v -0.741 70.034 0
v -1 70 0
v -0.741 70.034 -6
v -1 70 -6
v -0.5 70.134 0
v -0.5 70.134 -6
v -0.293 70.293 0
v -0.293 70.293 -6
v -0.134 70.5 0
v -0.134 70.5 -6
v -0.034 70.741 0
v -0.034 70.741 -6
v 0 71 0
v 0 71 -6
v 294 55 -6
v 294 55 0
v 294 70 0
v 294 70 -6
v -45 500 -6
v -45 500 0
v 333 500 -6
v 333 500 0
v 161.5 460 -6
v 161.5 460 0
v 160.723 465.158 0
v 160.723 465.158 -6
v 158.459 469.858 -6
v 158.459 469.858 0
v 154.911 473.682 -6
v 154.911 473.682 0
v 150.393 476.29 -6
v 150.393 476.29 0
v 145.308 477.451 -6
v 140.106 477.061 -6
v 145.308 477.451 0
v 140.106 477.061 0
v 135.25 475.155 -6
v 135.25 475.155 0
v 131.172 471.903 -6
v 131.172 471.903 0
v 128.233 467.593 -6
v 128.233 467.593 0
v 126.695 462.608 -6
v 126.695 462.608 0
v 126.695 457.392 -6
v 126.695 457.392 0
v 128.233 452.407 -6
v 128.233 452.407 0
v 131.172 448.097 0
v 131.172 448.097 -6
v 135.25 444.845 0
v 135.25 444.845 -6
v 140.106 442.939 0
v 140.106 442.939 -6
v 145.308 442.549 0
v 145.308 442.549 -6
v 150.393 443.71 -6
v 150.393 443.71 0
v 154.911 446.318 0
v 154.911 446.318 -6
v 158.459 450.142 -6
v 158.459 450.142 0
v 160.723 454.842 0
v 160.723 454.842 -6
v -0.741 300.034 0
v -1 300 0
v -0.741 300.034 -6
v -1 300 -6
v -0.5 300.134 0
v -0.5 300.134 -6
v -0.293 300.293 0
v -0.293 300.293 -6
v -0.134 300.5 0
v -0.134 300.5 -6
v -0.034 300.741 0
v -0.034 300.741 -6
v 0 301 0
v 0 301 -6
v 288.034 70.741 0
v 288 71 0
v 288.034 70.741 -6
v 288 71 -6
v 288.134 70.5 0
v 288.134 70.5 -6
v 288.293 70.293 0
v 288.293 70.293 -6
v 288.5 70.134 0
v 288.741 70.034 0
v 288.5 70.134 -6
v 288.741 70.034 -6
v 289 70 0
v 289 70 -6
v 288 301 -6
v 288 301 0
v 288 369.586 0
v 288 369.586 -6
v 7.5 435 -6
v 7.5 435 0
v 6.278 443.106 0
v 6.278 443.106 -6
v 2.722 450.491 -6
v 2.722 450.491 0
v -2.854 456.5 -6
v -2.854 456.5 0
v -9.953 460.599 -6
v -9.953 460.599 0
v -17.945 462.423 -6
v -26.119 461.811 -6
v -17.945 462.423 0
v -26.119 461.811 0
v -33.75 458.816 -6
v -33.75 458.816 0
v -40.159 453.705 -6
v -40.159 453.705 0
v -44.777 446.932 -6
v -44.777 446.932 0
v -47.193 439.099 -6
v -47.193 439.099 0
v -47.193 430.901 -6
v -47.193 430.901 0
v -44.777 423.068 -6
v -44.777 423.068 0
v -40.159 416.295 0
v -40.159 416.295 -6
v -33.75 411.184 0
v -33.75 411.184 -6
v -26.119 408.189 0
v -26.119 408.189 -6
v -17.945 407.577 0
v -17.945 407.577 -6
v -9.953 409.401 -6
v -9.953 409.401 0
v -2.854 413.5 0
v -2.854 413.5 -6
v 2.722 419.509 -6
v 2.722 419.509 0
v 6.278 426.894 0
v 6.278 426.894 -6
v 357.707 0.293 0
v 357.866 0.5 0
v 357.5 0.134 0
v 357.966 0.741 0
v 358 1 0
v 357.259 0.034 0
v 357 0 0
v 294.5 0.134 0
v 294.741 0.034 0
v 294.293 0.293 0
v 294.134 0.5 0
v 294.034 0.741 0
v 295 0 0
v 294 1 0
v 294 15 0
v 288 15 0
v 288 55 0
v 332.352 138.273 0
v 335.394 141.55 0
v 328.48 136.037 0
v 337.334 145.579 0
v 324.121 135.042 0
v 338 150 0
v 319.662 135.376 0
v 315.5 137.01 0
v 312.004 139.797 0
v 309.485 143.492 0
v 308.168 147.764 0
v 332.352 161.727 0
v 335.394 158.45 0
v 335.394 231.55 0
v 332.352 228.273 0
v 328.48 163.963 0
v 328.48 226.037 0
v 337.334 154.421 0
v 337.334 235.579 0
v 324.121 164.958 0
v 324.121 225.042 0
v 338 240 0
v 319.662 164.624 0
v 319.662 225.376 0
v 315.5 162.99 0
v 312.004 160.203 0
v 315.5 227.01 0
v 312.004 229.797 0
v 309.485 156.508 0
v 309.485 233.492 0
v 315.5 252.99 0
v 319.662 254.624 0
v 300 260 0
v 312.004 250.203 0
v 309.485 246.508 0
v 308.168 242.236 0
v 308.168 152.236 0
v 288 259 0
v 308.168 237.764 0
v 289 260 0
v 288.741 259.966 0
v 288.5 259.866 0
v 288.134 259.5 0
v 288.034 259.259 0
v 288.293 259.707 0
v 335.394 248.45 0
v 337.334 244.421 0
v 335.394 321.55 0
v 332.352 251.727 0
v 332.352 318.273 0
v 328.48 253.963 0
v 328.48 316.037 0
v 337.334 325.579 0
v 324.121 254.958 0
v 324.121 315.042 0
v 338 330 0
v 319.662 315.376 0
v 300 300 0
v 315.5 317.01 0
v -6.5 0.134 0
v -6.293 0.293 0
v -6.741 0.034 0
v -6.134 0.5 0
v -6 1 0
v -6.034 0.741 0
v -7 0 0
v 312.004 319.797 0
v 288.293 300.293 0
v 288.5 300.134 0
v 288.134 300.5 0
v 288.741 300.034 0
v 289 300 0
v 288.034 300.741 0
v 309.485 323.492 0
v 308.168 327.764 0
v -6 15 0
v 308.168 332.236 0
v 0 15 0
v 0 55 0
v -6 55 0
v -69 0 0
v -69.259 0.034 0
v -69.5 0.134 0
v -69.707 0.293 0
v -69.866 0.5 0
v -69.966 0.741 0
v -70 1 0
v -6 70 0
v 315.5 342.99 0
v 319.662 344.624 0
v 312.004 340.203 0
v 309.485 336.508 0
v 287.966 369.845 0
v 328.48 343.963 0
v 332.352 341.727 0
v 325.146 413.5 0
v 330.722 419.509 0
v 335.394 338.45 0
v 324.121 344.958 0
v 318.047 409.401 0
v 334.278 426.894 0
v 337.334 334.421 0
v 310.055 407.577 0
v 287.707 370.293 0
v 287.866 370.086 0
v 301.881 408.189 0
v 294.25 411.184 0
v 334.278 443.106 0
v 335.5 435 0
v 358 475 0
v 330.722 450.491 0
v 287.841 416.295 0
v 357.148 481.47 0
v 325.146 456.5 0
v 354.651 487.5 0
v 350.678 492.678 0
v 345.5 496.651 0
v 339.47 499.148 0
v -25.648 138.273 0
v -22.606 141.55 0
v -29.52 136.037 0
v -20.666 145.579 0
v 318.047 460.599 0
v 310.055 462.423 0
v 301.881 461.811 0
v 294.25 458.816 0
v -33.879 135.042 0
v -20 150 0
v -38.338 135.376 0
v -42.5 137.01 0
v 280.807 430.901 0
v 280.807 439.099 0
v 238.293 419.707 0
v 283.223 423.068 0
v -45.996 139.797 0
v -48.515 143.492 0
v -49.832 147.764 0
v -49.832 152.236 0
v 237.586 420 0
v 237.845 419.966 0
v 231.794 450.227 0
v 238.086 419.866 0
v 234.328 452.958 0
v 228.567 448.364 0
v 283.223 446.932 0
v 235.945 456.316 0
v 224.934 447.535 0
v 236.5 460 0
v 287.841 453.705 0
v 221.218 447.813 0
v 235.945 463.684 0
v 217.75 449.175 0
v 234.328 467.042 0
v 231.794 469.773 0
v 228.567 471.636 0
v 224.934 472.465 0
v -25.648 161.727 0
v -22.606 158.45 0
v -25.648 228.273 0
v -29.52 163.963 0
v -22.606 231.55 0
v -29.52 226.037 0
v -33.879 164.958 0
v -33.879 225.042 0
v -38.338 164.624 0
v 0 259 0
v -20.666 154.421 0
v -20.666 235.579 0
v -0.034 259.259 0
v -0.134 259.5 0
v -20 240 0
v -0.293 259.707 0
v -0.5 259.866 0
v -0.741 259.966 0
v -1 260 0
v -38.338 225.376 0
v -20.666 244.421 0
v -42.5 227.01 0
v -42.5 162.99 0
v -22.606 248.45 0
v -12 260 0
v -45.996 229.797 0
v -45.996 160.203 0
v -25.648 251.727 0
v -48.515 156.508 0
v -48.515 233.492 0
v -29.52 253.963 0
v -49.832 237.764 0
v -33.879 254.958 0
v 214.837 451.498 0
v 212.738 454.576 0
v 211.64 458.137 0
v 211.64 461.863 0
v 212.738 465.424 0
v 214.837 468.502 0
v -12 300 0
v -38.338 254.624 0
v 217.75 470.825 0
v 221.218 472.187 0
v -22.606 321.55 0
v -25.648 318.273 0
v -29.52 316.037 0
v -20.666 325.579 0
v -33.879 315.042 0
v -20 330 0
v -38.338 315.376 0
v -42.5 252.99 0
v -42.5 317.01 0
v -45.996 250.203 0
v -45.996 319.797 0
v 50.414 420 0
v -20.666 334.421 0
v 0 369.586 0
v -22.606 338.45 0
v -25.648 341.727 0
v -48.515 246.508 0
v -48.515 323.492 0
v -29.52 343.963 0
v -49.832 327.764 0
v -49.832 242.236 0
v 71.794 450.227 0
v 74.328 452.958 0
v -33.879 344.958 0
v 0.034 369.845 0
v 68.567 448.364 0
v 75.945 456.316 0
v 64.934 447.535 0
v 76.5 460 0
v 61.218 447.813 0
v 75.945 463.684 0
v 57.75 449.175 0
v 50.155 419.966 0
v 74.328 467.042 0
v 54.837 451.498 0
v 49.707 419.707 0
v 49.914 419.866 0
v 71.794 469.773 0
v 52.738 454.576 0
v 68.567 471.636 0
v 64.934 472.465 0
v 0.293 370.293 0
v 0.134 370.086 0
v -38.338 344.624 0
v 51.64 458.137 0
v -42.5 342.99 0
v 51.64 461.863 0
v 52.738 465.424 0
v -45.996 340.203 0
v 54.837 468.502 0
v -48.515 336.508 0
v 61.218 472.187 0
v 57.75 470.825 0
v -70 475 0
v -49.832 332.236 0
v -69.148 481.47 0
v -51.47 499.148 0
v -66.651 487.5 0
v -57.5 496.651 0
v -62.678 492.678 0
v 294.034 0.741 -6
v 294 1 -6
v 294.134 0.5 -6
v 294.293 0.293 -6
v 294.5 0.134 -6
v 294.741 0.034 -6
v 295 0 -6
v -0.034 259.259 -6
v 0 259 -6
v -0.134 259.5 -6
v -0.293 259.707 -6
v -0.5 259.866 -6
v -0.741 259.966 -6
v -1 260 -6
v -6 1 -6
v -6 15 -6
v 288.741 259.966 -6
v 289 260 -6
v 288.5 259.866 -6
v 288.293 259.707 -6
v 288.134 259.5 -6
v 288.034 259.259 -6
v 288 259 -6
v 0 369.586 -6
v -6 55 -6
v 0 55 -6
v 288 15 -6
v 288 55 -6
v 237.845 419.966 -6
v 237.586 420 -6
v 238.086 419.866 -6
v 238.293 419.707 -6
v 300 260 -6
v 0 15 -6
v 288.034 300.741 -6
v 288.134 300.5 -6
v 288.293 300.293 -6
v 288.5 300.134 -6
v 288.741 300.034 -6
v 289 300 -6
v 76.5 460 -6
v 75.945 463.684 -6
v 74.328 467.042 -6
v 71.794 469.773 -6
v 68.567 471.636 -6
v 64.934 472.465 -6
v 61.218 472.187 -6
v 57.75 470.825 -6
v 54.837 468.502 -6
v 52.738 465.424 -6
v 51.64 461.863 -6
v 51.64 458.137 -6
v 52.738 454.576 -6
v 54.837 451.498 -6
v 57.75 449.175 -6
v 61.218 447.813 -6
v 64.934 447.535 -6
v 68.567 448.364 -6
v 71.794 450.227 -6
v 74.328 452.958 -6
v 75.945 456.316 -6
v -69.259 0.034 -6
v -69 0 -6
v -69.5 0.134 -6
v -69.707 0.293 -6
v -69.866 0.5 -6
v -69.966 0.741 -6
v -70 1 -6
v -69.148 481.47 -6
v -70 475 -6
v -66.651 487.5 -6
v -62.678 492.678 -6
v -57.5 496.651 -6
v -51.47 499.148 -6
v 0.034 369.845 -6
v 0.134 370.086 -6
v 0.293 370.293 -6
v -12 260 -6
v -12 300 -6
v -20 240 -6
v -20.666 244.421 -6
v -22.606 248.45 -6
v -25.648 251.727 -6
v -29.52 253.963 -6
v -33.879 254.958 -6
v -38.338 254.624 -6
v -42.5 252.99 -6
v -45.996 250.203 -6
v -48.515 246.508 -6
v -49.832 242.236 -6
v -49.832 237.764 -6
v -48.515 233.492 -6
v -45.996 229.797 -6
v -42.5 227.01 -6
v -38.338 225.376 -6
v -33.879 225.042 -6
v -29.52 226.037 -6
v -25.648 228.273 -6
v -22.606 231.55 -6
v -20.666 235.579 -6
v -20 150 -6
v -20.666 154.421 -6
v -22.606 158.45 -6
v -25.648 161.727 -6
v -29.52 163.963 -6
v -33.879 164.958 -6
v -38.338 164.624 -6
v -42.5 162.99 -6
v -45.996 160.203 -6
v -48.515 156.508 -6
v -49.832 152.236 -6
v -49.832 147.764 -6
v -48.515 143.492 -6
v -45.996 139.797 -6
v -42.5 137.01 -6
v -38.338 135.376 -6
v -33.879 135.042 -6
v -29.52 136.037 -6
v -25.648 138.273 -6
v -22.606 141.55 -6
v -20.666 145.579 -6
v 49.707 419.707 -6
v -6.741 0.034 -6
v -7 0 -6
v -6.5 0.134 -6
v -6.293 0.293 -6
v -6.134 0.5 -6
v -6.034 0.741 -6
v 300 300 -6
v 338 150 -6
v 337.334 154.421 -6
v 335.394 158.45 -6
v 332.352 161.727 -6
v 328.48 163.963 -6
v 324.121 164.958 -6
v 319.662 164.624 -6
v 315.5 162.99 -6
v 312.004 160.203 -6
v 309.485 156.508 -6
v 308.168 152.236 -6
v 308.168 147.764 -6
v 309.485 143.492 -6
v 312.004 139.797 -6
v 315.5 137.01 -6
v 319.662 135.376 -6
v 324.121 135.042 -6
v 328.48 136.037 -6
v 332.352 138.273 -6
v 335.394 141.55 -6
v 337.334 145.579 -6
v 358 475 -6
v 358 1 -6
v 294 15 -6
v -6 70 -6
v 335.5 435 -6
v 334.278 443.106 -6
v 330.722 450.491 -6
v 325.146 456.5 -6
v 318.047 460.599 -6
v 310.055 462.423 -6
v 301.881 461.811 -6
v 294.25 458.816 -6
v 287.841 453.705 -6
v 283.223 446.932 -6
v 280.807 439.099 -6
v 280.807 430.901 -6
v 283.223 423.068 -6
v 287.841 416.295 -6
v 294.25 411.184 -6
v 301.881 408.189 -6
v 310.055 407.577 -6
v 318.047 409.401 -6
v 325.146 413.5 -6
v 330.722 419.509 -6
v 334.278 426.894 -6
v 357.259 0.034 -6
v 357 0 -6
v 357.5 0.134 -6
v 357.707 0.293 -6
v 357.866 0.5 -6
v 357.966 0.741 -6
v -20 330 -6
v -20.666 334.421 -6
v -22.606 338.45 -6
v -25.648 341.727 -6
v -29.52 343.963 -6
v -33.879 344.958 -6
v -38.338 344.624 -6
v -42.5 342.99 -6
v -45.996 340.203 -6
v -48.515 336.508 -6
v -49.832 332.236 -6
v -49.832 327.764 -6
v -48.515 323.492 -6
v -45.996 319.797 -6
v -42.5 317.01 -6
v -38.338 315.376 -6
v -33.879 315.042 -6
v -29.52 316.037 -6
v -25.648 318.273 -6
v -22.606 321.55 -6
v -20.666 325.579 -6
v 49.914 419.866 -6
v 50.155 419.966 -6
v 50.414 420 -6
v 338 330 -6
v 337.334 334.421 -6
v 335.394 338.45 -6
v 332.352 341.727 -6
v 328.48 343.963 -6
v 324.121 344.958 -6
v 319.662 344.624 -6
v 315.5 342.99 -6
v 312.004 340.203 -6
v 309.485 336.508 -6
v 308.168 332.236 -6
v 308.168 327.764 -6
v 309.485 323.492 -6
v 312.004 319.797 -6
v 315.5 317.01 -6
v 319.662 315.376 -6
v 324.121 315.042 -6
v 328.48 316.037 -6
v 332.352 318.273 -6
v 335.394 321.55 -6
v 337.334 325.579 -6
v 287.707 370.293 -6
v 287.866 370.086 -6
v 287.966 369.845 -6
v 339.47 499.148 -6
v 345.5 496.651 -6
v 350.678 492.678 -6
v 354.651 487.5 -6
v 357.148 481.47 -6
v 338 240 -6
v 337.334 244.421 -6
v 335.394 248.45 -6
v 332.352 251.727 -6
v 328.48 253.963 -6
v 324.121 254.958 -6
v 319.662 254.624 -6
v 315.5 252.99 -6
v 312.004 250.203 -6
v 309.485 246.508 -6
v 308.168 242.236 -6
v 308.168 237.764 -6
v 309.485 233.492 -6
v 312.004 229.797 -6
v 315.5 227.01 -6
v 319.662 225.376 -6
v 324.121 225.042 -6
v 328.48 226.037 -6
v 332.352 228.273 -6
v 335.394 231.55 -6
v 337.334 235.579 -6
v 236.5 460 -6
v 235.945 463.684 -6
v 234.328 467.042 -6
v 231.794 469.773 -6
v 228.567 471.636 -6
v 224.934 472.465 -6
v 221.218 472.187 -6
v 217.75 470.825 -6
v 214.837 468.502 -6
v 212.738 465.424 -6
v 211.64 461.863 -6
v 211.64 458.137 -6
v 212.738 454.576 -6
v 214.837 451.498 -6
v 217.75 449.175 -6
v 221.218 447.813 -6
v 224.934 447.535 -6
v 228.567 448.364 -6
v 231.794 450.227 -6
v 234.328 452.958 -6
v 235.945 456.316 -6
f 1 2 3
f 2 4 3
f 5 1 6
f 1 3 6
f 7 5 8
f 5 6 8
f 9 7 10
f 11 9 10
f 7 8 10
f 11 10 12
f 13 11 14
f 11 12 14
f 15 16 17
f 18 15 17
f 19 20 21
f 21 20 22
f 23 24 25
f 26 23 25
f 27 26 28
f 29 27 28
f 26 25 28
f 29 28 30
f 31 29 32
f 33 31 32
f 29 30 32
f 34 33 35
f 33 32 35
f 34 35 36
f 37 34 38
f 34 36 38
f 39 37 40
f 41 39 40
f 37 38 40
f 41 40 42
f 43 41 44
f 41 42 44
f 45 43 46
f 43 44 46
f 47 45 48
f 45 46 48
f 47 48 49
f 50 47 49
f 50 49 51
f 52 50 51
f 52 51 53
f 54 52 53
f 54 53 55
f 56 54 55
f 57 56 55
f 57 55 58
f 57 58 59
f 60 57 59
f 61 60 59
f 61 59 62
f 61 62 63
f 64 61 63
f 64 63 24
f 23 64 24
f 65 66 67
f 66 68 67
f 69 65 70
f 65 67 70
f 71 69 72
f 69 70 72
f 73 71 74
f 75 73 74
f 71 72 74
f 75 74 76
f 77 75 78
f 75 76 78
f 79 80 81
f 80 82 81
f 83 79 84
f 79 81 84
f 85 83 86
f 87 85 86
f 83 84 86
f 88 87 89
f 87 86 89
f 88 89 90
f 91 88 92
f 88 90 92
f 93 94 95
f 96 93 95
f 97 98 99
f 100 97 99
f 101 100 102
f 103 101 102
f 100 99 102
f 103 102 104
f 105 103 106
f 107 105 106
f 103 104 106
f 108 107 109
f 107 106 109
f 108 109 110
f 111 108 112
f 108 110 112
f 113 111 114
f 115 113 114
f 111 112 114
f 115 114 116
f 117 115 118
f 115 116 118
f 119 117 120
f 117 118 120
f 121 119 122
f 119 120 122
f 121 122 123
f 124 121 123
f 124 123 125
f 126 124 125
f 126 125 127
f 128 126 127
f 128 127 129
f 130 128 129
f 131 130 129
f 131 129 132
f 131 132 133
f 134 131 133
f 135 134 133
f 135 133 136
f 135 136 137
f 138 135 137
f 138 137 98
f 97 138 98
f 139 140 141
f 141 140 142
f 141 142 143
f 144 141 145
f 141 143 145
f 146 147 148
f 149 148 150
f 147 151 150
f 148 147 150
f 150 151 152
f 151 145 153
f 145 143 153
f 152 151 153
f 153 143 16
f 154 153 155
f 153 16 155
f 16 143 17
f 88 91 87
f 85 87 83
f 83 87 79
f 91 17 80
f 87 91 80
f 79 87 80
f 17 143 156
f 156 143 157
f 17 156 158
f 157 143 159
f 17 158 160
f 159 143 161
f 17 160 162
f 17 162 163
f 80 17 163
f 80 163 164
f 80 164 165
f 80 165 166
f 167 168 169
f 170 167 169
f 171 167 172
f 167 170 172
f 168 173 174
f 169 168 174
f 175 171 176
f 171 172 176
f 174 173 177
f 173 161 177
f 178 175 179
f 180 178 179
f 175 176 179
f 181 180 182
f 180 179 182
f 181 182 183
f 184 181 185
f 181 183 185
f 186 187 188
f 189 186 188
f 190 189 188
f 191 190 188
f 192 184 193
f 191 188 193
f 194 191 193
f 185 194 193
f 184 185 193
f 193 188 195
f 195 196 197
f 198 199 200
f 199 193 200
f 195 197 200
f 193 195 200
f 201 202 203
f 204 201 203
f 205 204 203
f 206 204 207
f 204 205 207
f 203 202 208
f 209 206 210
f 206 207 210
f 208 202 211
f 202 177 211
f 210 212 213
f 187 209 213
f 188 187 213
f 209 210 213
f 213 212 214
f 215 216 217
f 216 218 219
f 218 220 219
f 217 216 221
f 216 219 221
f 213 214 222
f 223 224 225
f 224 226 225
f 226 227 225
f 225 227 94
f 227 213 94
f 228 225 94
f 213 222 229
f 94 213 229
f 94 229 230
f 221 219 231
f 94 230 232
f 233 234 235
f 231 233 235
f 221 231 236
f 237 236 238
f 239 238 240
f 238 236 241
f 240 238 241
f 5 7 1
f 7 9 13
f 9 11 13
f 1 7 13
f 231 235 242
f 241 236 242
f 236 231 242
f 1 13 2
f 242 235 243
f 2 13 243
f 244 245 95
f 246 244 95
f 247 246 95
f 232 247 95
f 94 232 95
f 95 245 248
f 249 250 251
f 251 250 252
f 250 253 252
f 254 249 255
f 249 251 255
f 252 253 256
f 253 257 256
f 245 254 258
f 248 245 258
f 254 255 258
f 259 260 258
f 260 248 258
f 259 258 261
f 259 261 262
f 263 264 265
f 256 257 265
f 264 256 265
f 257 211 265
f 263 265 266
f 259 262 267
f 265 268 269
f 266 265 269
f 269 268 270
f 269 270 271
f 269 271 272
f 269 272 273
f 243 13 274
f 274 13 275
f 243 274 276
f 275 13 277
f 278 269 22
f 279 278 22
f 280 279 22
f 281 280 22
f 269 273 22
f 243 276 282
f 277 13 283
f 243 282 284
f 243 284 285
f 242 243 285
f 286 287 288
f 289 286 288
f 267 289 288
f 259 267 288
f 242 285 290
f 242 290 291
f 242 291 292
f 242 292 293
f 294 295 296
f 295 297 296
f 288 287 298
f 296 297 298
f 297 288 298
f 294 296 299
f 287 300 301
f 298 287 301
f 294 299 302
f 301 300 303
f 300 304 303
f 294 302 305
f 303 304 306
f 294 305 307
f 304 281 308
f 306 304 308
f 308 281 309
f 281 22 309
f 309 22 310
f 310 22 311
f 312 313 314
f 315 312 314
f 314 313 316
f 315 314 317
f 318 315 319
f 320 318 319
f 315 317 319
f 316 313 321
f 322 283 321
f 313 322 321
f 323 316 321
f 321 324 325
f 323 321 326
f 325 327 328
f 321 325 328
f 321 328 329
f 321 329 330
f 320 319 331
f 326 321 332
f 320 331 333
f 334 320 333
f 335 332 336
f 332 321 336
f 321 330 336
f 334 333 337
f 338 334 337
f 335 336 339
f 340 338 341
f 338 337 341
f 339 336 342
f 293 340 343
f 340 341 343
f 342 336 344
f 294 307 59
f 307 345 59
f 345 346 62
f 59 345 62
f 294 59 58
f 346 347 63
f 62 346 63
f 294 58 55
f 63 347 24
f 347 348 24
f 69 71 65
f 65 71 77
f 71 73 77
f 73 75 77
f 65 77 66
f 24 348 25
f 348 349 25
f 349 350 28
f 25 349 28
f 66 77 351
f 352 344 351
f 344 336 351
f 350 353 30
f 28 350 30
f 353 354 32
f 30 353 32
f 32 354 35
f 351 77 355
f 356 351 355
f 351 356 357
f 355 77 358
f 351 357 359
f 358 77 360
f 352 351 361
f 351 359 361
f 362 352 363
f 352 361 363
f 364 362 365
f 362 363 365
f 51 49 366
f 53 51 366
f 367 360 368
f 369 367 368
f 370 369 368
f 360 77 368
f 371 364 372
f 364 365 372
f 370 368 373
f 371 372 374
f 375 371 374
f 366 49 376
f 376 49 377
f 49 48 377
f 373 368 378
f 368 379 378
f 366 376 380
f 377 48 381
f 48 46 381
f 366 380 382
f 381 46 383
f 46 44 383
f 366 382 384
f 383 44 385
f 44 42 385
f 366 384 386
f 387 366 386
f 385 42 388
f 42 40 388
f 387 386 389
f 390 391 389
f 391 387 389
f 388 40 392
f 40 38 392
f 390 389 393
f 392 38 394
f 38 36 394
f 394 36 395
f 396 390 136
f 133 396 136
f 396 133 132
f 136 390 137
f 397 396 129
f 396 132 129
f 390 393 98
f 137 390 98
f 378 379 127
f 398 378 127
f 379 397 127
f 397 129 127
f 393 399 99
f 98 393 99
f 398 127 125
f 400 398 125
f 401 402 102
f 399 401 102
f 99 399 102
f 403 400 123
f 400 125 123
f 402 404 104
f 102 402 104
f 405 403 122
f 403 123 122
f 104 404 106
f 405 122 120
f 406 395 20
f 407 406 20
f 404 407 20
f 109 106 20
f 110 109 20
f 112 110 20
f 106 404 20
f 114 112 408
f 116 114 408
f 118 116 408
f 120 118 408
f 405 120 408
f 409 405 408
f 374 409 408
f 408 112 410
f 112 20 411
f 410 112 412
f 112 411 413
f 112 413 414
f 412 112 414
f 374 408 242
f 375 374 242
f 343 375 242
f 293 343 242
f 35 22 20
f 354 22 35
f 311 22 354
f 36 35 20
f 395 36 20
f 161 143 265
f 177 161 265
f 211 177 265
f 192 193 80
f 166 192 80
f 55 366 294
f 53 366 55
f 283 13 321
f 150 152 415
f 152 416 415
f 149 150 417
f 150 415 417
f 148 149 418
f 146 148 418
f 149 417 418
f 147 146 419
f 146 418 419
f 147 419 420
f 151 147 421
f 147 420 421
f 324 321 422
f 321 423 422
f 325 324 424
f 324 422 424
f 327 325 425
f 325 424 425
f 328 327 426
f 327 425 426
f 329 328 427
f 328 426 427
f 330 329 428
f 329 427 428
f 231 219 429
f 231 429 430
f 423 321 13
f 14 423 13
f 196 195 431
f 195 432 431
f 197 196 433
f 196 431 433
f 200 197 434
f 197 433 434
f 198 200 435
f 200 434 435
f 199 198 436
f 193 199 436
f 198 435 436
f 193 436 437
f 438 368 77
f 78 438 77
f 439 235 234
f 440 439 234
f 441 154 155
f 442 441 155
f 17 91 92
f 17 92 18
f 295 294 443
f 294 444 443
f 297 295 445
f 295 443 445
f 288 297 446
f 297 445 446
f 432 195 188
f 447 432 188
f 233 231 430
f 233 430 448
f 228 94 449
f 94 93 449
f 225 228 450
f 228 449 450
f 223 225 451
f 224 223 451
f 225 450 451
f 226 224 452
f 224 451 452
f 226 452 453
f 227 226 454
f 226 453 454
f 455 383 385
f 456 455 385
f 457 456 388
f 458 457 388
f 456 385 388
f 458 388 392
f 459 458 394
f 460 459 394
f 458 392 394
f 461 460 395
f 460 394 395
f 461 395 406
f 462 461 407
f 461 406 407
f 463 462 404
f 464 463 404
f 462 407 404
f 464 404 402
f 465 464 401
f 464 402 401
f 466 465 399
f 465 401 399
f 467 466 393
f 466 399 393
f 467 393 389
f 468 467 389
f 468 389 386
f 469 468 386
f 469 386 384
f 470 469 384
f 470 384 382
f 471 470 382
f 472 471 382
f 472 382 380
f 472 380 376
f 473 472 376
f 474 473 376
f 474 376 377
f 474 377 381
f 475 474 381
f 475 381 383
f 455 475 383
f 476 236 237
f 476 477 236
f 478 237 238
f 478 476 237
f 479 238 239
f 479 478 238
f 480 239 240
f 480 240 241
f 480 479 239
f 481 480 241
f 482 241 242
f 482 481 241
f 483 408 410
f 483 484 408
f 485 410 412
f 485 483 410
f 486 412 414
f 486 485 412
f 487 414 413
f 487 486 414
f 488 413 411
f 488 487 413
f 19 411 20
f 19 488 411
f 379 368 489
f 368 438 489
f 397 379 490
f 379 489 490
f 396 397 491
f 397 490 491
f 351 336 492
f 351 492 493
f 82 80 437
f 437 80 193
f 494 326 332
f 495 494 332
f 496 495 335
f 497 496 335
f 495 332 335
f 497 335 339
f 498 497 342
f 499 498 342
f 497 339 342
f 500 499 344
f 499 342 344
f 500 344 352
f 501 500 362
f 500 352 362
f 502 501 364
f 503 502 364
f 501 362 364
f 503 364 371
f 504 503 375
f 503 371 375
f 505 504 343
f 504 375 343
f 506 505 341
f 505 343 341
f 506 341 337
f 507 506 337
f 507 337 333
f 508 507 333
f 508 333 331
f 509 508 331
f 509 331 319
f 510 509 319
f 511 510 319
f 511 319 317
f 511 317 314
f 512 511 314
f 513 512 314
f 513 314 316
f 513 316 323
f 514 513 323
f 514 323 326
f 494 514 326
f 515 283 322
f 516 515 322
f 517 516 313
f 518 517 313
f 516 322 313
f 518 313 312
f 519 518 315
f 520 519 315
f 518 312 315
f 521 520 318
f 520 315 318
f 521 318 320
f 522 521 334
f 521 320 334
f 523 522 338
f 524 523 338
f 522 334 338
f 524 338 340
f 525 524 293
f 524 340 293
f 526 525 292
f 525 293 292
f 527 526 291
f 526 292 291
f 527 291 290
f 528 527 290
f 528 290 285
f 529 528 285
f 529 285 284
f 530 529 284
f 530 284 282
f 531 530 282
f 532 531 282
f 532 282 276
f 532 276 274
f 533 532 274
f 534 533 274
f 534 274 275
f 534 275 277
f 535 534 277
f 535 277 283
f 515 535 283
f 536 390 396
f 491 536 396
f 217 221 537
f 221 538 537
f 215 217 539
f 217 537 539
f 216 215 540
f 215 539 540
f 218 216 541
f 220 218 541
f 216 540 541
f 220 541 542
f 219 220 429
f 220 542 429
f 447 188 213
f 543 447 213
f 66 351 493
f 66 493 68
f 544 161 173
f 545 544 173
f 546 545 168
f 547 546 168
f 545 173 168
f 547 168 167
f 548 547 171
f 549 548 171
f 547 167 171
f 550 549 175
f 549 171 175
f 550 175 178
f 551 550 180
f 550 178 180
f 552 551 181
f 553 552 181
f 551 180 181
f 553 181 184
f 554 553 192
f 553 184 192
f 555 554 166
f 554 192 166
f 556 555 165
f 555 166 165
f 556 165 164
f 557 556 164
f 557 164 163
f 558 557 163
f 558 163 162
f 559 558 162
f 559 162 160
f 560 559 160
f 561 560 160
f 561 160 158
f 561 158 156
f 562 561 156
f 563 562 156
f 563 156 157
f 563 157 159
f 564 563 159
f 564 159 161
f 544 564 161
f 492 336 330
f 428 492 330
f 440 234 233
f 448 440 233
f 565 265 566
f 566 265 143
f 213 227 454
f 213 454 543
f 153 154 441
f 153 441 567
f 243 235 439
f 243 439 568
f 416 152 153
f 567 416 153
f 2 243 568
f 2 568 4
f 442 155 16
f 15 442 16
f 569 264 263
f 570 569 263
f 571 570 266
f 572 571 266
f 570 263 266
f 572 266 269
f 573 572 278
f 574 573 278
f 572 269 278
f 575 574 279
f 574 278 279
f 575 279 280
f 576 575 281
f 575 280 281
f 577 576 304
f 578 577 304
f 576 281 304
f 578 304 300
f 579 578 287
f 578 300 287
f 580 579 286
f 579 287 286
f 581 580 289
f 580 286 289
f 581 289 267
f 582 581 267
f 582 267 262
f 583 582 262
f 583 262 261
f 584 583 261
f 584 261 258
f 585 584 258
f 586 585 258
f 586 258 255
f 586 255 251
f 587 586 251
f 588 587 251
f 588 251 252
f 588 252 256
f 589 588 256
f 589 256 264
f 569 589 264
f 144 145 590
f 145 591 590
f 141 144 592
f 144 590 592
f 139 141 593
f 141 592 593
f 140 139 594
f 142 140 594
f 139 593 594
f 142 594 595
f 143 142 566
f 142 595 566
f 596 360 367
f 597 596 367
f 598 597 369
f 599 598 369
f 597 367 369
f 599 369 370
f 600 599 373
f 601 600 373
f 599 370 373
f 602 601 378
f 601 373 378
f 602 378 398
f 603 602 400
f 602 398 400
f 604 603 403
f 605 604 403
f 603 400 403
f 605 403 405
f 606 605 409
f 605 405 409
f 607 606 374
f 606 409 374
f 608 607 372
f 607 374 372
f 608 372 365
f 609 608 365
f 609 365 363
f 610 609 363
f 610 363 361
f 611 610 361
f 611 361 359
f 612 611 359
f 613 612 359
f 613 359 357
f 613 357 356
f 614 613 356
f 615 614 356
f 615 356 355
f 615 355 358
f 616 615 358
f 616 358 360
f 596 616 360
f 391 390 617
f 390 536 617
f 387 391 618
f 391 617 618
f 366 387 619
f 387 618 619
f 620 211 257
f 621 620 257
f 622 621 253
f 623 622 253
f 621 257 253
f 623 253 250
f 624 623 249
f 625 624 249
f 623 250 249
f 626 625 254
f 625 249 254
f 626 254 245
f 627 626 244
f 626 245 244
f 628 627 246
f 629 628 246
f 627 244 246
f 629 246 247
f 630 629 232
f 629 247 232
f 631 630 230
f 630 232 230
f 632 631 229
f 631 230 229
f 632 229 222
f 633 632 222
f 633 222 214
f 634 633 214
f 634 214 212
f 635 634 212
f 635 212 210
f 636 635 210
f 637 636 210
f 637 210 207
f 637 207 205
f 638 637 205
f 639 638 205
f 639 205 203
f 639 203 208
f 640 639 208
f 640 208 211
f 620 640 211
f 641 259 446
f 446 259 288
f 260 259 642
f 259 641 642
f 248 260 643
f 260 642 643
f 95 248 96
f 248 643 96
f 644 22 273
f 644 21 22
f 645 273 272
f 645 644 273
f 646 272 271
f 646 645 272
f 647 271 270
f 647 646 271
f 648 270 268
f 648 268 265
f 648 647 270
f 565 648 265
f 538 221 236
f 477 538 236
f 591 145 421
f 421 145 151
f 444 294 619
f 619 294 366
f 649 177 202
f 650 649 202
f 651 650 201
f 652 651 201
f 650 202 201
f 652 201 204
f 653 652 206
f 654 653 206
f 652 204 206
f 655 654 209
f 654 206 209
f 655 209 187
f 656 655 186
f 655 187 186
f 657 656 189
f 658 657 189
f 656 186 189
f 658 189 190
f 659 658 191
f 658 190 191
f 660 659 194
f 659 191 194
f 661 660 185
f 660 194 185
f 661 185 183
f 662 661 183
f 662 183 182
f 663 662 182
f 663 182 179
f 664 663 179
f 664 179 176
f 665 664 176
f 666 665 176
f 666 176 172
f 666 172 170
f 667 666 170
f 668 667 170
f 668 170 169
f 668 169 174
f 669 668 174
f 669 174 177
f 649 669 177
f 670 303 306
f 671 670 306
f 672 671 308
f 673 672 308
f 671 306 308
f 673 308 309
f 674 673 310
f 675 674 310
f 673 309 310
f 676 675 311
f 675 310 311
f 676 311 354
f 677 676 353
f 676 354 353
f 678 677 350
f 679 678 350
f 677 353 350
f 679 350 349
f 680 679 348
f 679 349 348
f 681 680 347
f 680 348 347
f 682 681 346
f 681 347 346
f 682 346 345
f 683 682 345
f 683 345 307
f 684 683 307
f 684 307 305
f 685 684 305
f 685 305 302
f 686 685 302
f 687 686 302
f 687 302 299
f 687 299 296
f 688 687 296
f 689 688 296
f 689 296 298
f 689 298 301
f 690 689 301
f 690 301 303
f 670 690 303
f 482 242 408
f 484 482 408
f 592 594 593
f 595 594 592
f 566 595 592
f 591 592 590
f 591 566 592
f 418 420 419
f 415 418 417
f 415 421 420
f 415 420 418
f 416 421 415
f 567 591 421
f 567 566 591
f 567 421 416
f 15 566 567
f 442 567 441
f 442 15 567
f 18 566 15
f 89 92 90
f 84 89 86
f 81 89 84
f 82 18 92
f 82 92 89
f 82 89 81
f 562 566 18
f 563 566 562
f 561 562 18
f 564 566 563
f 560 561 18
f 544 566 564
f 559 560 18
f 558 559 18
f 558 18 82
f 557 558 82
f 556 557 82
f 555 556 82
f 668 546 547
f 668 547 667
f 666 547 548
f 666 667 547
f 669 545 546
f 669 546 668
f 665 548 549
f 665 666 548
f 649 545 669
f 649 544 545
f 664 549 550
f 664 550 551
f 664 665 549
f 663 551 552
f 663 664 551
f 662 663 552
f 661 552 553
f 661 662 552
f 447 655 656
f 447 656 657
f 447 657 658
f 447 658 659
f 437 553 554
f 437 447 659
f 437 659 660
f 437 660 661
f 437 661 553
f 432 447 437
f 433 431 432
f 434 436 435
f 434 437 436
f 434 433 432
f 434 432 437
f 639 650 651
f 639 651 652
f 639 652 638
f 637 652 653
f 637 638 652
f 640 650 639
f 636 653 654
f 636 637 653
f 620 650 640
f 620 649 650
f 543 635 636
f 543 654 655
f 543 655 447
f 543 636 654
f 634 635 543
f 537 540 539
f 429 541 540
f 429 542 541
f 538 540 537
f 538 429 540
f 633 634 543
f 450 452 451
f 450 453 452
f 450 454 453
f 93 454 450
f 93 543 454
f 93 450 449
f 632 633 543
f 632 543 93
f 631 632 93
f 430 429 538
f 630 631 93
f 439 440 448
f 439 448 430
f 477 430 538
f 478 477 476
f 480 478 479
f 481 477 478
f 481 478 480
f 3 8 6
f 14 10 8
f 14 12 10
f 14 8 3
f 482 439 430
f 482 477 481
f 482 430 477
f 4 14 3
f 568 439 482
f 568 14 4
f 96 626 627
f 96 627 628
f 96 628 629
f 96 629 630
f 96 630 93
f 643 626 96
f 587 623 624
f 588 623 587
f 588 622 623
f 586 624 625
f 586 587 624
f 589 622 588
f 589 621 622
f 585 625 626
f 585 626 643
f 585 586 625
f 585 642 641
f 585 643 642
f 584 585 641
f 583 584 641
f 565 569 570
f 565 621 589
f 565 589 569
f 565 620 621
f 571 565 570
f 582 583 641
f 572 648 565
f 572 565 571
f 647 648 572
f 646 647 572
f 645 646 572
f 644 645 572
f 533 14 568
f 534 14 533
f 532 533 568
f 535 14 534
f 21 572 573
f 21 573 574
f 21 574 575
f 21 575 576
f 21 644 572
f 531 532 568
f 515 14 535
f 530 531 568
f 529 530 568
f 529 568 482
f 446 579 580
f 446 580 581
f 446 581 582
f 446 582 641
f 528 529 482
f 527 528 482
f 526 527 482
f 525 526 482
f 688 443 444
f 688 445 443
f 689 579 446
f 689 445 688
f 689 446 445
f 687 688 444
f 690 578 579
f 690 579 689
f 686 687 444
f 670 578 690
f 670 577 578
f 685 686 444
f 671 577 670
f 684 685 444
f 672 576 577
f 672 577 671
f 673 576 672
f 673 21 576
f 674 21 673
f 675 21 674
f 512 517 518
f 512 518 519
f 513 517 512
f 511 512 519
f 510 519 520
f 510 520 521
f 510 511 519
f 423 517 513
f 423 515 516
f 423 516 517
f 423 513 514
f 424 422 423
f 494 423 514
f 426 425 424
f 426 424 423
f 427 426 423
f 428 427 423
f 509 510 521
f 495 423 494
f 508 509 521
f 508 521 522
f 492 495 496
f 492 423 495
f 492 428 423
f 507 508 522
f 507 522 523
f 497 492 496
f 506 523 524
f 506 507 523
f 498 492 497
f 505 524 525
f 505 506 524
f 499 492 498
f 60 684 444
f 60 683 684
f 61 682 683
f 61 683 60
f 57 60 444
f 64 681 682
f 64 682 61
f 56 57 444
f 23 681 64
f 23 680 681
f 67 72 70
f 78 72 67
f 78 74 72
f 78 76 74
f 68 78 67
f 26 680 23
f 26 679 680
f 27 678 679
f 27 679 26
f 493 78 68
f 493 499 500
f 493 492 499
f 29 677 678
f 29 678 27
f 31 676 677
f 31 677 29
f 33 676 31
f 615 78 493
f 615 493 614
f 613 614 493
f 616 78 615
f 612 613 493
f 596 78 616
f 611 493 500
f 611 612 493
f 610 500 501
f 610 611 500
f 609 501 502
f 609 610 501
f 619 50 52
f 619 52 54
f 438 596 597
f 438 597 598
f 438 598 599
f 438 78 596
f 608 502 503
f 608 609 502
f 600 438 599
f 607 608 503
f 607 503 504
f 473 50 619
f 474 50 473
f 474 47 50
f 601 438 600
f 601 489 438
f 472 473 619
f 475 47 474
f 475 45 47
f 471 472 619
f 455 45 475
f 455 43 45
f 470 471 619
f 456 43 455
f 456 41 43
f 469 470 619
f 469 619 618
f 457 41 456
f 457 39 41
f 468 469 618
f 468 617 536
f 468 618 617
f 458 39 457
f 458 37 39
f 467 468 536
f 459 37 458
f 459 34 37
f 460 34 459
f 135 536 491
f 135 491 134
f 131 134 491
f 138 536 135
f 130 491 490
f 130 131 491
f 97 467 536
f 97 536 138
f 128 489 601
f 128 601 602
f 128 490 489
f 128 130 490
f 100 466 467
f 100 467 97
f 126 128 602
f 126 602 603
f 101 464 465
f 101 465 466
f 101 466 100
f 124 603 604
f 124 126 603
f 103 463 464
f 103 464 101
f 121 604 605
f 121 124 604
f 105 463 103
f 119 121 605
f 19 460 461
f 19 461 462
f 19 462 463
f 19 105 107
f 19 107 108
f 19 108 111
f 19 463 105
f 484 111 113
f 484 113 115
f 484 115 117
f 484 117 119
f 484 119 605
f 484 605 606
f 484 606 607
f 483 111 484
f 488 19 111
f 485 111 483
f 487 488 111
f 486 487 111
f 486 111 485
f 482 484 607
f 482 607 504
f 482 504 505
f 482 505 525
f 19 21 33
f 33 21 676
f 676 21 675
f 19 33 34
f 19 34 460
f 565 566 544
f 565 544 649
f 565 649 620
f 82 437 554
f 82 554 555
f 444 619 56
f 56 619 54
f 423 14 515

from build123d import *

# Parameters (mm, degrees)
TOWER_DEPTH = 6
SKETCH2_W   = 6
SKETCH2_H   = 15
SKETCH2_W_2 = 12
SKETCH2_H_2 = 40
MOUNT_DEPTH = 615.979674461
FILLET_2_R  = 1
SKETCH3_R   = 12.5
SKETCH3_R_2 = 17.5
SKETCH3_R_3 = 27.5
SKETCH3_R_4 = 15
LITE_DEPTH  = 615.979674461
FILLET2_R   = 25


with BuildPart() as part:
    # Sketch1 → tower (new body)
    with BuildSketch(Plane.XY):
        Polygon((0, 0), (-70, 0), (-70, 500), (358, 500), (358, 0), (288, 0), (288, 370), (238, 420), (50, 420), (0, 370), align=None)
    extrude(amount=-TOWER_DEPTH)

    # Sketch2 → mount (cut, through all)
    with BuildSketch(Plane.XY):
        with Locations((-3, 62.5)):
            Rectangle(SKETCH2_W, SKETCH2_H)
        with Locations((-3, 7.5)):
            Rectangle(SKETCH2_W, SKETCH2_H)
        with Locations((291, 7.5)):
            Rectangle(SKETCH2_W, SKETCH2_H)
        with Locations((291, 62.5)):
            Rectangle(SKETCH2_W, SKETCH2_H)
        with Locations((-6, 280)):
            Rectangle(SKETCH2_W_2, SKETCH2_H_2)
        with Locations((294, 280)):
            Rectangle(SKETCH2_W_2, SKETCH2_H_2)
    extrude(amount=-MOUNT_DEPTH, mode=Mode.SUBTRACT)

    # fillet 2
    fillet_2_edges = [part.edges().sort_by_distance(p)[0] for p in [
        (288, 300, -3),
        (288, 260, -3),
        (-70, 0, -3),
        (358, 0, -3),
        (288, 370, -3),
        (238, 420, -3),
        (50, 420, -3),
        (0, 370, -3),
        (0, 70, -3),
        (-6, 0, -3),
        (288, 70, -3),
        (294, 0, -3),
        (0, 260, -3),
        (0, 300, -3),
    ]]
    fillet(fillet_2_edges, radius=FILLET_2_R)

    # Sketch3 → lite (cut, through all)
    with BuildSketch(Plane.XY):
        with Locations((64, 460)):
            Circle(SKETCH3_R)
        with Locations((144, 460)):
            Circle(SKETCH3_R_2)
        with Locations((224, 460)):
            Circle(SKETCH3_R)
        with Locations((-20, 435)):
            Circle(SKETCH3_R_3)
        with Locations((308, 435)):
            Circle(SKETCH3_R_3)
        with Locations((-35, 330)):
            Circle(SKETCH3_R_4)
        with Locations((-35, 240)):
            Circle(SKETCH3_R_4)
        with Locations((-35, 150)):
            Circle(SKETCH3_R_4)
        with Locations((323, 330)):
            Circle(SKETCH3_R_4)
        with Locations((323, 240)):
            Circle(SKETCH3_R_4)
        with Locations((323, 150)):
            Circle(SKETCH3_R_4)
    extrude(amount=-LITE_DEPTH, mode=Mode.SUBTRACT)

    # fillet2
    fillet2_edges = [part.edges().sort_by_distance(p)[0] for p in [
        (-70, 500, -3),
        (358, 500, -3),
    ]]
    fillet(fillet2_edges, radius=FILLET2_R)


solid = part.part
